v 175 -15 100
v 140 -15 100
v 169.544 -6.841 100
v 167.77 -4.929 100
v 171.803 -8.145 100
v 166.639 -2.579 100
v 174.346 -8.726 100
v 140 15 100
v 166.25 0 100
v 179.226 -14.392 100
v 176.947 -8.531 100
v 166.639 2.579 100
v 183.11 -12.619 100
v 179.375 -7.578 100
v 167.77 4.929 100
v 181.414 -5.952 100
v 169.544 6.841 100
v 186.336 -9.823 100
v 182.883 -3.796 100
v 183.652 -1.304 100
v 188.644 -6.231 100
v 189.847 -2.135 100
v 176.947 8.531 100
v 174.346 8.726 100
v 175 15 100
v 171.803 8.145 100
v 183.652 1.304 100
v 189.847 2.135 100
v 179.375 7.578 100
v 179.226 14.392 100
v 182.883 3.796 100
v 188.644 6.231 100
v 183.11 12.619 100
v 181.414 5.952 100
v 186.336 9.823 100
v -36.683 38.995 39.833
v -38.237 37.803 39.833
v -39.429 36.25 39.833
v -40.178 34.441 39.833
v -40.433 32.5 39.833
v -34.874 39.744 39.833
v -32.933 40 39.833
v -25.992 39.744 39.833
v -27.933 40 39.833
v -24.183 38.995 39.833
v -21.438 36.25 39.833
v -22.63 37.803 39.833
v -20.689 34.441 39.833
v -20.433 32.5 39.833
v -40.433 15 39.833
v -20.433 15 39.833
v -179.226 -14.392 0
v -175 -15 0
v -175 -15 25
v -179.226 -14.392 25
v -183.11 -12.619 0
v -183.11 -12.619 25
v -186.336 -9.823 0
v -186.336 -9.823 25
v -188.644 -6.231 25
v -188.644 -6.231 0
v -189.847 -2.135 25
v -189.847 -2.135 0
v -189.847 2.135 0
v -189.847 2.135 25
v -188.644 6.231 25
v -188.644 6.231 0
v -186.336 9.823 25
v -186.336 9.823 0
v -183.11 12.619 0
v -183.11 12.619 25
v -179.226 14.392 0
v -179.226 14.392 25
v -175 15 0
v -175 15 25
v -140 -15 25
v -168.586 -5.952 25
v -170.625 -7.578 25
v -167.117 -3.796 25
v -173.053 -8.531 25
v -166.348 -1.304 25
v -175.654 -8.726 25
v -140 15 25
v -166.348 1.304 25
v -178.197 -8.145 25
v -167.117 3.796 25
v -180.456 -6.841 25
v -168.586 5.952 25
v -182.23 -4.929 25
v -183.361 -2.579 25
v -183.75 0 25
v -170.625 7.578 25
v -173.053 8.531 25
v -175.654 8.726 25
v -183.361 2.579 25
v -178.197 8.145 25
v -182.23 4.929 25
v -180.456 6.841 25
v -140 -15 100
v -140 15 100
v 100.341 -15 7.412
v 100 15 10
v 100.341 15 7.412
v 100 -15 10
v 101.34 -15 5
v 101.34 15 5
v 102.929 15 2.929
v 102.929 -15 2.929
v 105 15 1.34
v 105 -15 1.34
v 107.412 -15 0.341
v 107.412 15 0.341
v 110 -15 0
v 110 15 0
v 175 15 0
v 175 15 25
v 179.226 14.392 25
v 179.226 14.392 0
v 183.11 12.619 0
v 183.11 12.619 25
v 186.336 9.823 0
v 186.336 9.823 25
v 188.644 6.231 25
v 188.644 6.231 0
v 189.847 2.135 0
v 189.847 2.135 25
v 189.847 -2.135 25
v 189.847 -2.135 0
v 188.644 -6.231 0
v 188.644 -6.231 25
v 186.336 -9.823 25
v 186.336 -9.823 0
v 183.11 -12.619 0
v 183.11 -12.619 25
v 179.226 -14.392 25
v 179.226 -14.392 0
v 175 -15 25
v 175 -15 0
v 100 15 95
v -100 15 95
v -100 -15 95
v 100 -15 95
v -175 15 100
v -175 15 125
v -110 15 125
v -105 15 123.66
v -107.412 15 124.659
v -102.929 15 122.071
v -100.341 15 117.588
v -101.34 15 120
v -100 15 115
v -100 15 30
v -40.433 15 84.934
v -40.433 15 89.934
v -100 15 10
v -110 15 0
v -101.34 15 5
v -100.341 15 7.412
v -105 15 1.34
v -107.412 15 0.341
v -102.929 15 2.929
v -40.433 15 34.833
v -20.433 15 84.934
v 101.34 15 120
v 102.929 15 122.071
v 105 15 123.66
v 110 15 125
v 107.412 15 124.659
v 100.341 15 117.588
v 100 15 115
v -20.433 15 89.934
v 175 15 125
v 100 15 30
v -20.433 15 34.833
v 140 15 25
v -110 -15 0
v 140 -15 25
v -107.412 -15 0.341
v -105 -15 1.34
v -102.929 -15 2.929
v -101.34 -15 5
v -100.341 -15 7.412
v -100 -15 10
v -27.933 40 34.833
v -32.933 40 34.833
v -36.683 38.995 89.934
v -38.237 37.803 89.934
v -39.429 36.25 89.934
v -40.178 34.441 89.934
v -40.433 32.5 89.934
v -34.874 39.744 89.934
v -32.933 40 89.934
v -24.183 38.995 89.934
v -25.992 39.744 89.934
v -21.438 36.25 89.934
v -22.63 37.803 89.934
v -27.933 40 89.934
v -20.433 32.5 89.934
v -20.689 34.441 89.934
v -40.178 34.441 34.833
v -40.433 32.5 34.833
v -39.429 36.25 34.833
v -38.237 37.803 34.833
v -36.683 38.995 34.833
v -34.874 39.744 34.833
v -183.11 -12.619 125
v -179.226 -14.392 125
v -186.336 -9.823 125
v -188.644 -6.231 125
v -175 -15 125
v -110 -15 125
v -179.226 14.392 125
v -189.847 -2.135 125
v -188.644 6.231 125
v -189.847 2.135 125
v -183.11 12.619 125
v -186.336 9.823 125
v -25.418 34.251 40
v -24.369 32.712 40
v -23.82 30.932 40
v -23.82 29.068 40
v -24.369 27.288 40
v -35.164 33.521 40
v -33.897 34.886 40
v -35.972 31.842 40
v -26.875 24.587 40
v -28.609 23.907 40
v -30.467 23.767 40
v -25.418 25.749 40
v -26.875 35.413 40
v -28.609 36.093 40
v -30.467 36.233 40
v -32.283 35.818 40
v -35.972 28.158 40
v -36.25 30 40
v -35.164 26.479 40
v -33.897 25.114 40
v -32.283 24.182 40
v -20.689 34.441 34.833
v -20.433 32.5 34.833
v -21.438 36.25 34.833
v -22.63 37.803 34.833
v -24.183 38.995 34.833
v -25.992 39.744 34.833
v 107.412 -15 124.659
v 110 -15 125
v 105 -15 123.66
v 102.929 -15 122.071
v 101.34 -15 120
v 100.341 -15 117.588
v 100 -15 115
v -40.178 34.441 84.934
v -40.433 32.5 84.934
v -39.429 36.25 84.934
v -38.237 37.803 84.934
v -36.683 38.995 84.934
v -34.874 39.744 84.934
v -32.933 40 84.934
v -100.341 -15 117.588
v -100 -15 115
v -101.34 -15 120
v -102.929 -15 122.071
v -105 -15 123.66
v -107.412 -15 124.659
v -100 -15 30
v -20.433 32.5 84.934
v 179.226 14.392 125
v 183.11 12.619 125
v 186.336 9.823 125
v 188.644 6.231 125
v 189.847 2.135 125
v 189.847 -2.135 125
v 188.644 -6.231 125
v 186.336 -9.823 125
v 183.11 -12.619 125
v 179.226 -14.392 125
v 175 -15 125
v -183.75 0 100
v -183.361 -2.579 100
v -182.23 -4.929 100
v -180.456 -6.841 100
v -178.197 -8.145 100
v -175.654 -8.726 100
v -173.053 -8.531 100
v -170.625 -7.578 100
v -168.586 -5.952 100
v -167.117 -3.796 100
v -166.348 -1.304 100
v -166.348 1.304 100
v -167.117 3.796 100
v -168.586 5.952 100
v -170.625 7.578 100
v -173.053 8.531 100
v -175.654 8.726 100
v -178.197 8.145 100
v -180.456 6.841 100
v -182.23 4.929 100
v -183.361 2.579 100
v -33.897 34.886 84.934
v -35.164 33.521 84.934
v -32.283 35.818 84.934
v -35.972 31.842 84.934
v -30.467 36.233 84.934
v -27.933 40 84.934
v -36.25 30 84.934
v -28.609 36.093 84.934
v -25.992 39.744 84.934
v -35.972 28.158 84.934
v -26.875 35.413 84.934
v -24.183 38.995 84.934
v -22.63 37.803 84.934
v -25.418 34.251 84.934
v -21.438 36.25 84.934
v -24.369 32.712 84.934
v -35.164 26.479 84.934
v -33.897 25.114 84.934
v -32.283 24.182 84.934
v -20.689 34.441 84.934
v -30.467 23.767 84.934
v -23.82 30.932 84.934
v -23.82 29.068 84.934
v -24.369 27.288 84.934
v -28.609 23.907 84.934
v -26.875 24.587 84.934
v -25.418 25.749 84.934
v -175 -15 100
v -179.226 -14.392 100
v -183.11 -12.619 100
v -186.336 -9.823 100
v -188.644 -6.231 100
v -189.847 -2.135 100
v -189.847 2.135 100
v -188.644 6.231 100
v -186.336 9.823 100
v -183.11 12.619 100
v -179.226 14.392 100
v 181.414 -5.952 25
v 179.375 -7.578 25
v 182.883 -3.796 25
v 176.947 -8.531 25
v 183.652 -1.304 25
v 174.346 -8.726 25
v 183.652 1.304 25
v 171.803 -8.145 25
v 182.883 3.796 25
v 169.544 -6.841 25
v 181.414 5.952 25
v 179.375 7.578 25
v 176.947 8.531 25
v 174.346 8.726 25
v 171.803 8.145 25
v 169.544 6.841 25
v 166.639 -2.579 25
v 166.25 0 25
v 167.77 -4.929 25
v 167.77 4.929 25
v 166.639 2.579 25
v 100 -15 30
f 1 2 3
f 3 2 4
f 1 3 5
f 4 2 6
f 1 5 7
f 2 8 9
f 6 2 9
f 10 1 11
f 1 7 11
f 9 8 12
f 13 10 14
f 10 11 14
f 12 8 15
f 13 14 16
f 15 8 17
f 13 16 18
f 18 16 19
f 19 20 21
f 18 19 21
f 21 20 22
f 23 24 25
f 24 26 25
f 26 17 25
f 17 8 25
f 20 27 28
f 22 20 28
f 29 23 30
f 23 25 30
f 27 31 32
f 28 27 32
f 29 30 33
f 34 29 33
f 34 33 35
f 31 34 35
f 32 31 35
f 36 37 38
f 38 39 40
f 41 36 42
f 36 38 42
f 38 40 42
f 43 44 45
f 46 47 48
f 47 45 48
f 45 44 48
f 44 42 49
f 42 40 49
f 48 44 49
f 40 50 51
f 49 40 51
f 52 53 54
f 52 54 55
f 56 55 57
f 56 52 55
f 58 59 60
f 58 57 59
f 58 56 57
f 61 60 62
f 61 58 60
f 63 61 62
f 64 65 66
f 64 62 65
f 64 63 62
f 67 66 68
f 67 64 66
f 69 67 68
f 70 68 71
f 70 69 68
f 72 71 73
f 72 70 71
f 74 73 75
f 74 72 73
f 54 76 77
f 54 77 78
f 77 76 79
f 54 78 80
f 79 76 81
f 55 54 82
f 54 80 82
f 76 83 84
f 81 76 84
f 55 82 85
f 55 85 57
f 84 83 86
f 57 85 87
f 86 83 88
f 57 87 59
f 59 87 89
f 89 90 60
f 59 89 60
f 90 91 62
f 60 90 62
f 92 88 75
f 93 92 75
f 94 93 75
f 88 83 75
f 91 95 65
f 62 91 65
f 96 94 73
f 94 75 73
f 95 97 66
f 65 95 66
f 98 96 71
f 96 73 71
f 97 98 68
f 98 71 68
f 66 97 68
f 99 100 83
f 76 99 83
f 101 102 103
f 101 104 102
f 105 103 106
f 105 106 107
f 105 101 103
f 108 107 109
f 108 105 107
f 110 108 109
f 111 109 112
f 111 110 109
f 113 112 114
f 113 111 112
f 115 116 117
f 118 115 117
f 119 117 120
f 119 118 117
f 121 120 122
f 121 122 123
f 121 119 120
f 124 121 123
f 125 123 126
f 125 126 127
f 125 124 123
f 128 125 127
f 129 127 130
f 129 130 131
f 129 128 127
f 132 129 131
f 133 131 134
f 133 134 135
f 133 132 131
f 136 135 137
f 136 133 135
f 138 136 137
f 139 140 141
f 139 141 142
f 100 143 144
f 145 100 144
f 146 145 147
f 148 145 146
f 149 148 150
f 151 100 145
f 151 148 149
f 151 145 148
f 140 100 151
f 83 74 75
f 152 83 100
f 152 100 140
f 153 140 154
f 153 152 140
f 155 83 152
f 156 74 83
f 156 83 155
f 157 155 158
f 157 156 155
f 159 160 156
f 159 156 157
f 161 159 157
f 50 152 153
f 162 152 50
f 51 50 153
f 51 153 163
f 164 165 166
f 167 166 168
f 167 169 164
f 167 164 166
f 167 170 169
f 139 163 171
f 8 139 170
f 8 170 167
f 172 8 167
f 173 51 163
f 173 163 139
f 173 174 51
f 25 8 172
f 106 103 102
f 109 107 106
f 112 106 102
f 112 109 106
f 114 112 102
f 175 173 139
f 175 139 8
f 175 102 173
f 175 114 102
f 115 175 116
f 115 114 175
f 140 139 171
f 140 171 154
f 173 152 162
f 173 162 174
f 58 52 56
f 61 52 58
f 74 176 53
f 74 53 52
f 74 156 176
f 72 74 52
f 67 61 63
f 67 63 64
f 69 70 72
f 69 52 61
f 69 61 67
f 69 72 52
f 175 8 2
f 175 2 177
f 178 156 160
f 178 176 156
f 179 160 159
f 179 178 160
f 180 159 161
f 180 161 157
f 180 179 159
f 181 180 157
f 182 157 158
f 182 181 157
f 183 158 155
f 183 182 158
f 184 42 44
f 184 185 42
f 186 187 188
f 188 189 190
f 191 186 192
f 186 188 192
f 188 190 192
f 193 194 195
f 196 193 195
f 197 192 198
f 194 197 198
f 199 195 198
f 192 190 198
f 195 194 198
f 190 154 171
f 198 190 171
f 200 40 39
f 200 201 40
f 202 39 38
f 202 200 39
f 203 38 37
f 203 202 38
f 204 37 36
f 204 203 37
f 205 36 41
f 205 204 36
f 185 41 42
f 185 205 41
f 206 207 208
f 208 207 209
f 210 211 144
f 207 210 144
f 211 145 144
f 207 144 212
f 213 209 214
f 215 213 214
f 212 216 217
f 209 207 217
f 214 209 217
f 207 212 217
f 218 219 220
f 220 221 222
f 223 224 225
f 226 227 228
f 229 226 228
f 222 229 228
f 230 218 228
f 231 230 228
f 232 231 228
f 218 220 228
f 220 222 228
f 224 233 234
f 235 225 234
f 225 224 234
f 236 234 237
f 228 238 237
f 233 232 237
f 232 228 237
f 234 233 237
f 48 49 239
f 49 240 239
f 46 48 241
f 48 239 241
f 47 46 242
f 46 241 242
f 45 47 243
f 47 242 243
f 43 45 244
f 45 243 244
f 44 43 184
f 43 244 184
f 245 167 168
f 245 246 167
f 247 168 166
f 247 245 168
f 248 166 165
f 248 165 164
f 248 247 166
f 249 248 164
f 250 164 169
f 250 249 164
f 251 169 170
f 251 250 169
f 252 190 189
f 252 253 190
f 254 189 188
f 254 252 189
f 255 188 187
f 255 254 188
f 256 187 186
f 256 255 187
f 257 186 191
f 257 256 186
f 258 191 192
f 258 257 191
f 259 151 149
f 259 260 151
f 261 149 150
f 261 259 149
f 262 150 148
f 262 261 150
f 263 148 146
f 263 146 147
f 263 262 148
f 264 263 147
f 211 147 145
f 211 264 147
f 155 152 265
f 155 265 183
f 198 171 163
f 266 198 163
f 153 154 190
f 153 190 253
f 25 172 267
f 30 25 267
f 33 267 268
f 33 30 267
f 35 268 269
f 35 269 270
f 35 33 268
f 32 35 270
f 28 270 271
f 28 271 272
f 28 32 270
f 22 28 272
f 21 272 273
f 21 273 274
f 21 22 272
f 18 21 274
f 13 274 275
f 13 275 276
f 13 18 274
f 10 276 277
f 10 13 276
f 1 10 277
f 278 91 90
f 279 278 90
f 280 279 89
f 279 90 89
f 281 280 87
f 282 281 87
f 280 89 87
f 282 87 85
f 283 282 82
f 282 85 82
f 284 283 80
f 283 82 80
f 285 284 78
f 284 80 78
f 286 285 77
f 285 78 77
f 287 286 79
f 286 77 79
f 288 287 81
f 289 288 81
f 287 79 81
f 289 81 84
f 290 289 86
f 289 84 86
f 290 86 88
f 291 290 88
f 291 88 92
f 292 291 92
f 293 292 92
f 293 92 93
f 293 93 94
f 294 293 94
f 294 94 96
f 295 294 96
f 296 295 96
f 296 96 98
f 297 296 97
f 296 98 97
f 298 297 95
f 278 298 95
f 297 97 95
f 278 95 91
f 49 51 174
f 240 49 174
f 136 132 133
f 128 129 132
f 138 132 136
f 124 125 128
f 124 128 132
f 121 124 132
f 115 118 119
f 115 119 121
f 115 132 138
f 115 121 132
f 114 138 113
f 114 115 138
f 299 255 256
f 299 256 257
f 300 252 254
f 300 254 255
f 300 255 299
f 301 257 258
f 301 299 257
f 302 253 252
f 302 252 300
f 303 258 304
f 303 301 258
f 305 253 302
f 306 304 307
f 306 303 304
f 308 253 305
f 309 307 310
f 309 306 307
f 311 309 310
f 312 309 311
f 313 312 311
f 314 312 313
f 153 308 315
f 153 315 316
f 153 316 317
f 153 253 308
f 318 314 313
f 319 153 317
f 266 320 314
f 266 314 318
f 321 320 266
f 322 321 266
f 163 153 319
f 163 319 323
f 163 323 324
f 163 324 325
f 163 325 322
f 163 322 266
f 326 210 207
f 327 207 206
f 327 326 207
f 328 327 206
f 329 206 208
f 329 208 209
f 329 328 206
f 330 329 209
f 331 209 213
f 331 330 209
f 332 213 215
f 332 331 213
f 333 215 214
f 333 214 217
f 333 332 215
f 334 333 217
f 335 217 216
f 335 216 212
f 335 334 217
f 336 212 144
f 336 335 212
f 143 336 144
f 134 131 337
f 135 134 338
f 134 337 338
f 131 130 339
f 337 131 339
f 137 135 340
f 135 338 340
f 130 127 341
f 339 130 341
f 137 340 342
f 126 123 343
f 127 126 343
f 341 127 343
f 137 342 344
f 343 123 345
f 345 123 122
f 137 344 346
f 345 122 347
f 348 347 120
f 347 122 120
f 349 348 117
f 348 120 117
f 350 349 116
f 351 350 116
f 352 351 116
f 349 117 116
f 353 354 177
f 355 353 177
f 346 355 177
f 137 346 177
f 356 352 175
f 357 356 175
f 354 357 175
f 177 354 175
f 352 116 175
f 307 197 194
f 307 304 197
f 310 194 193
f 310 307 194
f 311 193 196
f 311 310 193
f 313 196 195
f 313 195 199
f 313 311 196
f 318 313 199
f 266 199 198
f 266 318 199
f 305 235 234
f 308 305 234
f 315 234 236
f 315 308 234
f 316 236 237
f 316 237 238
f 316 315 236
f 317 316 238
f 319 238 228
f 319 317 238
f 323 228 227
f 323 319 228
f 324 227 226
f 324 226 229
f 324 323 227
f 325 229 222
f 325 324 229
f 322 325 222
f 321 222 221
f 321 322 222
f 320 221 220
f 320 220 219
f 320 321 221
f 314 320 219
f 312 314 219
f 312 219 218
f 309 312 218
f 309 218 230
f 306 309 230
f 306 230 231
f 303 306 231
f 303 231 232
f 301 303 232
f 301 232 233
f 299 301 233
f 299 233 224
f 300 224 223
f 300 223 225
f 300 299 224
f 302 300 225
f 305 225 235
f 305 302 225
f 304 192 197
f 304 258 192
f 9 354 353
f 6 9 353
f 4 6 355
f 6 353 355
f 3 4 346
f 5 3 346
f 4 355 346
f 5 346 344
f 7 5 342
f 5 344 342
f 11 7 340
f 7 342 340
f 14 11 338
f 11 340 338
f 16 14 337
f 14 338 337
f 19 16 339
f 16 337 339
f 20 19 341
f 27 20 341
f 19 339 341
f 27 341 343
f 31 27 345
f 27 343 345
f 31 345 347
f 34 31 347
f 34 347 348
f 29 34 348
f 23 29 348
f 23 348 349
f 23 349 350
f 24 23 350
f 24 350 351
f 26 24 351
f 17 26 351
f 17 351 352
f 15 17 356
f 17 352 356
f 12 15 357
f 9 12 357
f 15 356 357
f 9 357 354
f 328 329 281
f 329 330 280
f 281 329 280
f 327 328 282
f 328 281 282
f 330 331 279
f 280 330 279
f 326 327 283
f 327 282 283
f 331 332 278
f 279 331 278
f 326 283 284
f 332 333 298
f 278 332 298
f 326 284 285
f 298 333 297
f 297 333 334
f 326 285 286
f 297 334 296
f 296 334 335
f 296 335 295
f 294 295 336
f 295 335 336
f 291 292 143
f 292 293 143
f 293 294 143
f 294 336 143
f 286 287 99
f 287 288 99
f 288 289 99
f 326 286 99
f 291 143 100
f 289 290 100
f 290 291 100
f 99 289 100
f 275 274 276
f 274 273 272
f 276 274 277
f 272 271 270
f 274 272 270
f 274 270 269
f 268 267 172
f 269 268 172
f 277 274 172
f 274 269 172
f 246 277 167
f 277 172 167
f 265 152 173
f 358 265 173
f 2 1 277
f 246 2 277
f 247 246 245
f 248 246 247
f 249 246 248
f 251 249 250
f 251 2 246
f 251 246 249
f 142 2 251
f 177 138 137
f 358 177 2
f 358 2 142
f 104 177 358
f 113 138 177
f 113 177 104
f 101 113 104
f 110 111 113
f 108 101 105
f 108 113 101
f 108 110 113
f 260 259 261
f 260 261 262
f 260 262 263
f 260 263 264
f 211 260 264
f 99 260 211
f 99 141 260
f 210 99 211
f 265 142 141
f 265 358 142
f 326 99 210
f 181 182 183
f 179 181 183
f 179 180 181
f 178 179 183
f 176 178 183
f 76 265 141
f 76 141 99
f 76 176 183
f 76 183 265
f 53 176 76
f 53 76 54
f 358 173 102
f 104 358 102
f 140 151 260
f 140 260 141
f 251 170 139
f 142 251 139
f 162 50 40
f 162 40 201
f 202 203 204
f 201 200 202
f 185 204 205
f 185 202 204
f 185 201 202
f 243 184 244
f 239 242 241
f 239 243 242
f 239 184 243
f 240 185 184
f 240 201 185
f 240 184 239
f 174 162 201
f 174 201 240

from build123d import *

# Parameters (mm, degrees)
BOSS_EXTRUDE1_DEPTH = 125
SKETCH2_W           = 35
SKETCH2_H           = 75
SKETCH2_W_2         = 15
CUT_EXTRUDE1_DEPTH  = 100
SKETCH3_R           = 8.75
BOSS_EXTRUDE2_DEPTH = 75
SKETCH4_W           = 200
SKETCH4_H           = 30
CUT_EXTRUDE2_DEPTH  = 230.401394939
FILLET1_R           = 10
SKETCH6_R           = 6.25
BOSS_EXTRUDE3_DEPTH = 22.5
SKETCH7_W           = 20
SKETCH7_H           = 5
BOSS_EXTRUDE4_DEPTH = 40
FILLET2_R           = 7.5


with BuildPart() as part:
    # Sketch1 → Boss-Extrude1 (new body)
    with BuildSketch(Plane.XY):
        with BuildLine():
            Line((-175, 15), (175, 15))
            ThreePointArc((175, 15), (190, 0), (175, -15))
            Line((175, -15), (-175, -15))
            ThreePointArc((-175, -15), (-190, 0), (-175, 15))
        make_face()
    extrude(amount=BOSS_EXTRUDE1_DEPTH)

    # Sketch2 → Cut-Extrude1 (cut)
    with BuildSketch(Plane(origin=(0, 15, 0), x_dir=(1, 0, 0), z_dir=(0, 1, 0))):
        with Locations((-157.5, -62.5)):
            Rectangle(SKETCH2_W, SKETCH2_H)
        with Locations((-182.5, -62.5)):
            Rectangle(SKETCH2_W_2, SKETCH2_H)
        with Locations((182.5, -62.5)):
            Rectangle(SKETCH2_W_2, SKETCH2_H)
        with Locations((157.5, -62.5)):
            Rectangle(SKETCH2_W, SKETCH2_H)
    extrude(amount=-CUT_EXTRUDE1_DEPTH, mode=Mode.SUBTRACT)

    # Sketch3 → Boss-Extrude2 (add)
    with BuildSketch(Plane.XY.offset(25)):
        with Locations(Location((-175, 0, 0), (0, 0, 180))):
            Circle(SKETCH3_R)
        with Locations(Location((175, 0, 0), (0, 0, 180))):
            Circle(SKETCH3_R)
    extrude(amount=BOSS_EXTRUDE2_DEPTH)

    # Sketch4 → Cut-Extrude2 (cut, through all)
    with BuildSketch(Plane(origin=(0, 15, 0), x_dir=(1, 0, 0), z_dir=(0, 1, 0))):
        with Locations((0, -15)):
            Rectangle(SKETCH4_W, SKETCH4_H)
        with Locations((0, -110)):
            Rectangle(SKETCH4_W, SKETCH4_H)
    extrude(amount=-CUT_EXTRUDE2_DEPTH, mode=Mode.SUBTRACT)

    # Fillet1
    fillet1_edges = [part.edges().sort_by_distance(p)[0] for p in [
        (-100, 0, 0),
        (100, 0, 0),
        (100, 0, 125),
        (-100, 0, 125),
    ]]
    fillet(fillet1_edges, radius=FILLET1_R)



with BuildPart() as body_2:
    # Sketch6 → Boss-Extrude3 (new, symmetric)
    with BuildSketch(Plane.XY.offset(62.5)):
        with Locations(Location((-30, 30, 0), (0, 0, 180))):
            Circle(SKETCH6_R)
    extrude(amount=BOSS_EXTRUDE3_DEPTH, both=True)


with BuildPart() as part_1:
    add(part.part)

    add(body_2.part)  # Boss-Extrude4 merges body 2
    # Sketch7 → Boss-Extrude4 (add)
    with BuildSketch(Plane(origin=(0, 0, 0), x_dir=(1, 0, 0), z_dir=(0, 1, 0))):
        with Locations((-30.433316443, -87.433842939)):
            Rectangle(SKETCH7_W, SKETCH7_H)
        with Locations((-30.433316443, -37.333363873)):
            Rectangle(SKETCH7_W, SKETCH7_H)
    extrude(amount=BOSS_EXTRUDE4_DEPTH)

    # Fillet2
    fillet2_edges = [part_1.edges().sort_by_distance(p)[0] for p in [
        (-20.433316443, 40, 87.433842939),
        (-40.433316443, 40, 87.433842939),
        (-40.433316443, 40, 37.333363873),
        (-20.433316443, 40, 37.333363873),
    ]]
    fillet(fillet2_edges, radius=FILLET2_R)


solid = part_1.part
